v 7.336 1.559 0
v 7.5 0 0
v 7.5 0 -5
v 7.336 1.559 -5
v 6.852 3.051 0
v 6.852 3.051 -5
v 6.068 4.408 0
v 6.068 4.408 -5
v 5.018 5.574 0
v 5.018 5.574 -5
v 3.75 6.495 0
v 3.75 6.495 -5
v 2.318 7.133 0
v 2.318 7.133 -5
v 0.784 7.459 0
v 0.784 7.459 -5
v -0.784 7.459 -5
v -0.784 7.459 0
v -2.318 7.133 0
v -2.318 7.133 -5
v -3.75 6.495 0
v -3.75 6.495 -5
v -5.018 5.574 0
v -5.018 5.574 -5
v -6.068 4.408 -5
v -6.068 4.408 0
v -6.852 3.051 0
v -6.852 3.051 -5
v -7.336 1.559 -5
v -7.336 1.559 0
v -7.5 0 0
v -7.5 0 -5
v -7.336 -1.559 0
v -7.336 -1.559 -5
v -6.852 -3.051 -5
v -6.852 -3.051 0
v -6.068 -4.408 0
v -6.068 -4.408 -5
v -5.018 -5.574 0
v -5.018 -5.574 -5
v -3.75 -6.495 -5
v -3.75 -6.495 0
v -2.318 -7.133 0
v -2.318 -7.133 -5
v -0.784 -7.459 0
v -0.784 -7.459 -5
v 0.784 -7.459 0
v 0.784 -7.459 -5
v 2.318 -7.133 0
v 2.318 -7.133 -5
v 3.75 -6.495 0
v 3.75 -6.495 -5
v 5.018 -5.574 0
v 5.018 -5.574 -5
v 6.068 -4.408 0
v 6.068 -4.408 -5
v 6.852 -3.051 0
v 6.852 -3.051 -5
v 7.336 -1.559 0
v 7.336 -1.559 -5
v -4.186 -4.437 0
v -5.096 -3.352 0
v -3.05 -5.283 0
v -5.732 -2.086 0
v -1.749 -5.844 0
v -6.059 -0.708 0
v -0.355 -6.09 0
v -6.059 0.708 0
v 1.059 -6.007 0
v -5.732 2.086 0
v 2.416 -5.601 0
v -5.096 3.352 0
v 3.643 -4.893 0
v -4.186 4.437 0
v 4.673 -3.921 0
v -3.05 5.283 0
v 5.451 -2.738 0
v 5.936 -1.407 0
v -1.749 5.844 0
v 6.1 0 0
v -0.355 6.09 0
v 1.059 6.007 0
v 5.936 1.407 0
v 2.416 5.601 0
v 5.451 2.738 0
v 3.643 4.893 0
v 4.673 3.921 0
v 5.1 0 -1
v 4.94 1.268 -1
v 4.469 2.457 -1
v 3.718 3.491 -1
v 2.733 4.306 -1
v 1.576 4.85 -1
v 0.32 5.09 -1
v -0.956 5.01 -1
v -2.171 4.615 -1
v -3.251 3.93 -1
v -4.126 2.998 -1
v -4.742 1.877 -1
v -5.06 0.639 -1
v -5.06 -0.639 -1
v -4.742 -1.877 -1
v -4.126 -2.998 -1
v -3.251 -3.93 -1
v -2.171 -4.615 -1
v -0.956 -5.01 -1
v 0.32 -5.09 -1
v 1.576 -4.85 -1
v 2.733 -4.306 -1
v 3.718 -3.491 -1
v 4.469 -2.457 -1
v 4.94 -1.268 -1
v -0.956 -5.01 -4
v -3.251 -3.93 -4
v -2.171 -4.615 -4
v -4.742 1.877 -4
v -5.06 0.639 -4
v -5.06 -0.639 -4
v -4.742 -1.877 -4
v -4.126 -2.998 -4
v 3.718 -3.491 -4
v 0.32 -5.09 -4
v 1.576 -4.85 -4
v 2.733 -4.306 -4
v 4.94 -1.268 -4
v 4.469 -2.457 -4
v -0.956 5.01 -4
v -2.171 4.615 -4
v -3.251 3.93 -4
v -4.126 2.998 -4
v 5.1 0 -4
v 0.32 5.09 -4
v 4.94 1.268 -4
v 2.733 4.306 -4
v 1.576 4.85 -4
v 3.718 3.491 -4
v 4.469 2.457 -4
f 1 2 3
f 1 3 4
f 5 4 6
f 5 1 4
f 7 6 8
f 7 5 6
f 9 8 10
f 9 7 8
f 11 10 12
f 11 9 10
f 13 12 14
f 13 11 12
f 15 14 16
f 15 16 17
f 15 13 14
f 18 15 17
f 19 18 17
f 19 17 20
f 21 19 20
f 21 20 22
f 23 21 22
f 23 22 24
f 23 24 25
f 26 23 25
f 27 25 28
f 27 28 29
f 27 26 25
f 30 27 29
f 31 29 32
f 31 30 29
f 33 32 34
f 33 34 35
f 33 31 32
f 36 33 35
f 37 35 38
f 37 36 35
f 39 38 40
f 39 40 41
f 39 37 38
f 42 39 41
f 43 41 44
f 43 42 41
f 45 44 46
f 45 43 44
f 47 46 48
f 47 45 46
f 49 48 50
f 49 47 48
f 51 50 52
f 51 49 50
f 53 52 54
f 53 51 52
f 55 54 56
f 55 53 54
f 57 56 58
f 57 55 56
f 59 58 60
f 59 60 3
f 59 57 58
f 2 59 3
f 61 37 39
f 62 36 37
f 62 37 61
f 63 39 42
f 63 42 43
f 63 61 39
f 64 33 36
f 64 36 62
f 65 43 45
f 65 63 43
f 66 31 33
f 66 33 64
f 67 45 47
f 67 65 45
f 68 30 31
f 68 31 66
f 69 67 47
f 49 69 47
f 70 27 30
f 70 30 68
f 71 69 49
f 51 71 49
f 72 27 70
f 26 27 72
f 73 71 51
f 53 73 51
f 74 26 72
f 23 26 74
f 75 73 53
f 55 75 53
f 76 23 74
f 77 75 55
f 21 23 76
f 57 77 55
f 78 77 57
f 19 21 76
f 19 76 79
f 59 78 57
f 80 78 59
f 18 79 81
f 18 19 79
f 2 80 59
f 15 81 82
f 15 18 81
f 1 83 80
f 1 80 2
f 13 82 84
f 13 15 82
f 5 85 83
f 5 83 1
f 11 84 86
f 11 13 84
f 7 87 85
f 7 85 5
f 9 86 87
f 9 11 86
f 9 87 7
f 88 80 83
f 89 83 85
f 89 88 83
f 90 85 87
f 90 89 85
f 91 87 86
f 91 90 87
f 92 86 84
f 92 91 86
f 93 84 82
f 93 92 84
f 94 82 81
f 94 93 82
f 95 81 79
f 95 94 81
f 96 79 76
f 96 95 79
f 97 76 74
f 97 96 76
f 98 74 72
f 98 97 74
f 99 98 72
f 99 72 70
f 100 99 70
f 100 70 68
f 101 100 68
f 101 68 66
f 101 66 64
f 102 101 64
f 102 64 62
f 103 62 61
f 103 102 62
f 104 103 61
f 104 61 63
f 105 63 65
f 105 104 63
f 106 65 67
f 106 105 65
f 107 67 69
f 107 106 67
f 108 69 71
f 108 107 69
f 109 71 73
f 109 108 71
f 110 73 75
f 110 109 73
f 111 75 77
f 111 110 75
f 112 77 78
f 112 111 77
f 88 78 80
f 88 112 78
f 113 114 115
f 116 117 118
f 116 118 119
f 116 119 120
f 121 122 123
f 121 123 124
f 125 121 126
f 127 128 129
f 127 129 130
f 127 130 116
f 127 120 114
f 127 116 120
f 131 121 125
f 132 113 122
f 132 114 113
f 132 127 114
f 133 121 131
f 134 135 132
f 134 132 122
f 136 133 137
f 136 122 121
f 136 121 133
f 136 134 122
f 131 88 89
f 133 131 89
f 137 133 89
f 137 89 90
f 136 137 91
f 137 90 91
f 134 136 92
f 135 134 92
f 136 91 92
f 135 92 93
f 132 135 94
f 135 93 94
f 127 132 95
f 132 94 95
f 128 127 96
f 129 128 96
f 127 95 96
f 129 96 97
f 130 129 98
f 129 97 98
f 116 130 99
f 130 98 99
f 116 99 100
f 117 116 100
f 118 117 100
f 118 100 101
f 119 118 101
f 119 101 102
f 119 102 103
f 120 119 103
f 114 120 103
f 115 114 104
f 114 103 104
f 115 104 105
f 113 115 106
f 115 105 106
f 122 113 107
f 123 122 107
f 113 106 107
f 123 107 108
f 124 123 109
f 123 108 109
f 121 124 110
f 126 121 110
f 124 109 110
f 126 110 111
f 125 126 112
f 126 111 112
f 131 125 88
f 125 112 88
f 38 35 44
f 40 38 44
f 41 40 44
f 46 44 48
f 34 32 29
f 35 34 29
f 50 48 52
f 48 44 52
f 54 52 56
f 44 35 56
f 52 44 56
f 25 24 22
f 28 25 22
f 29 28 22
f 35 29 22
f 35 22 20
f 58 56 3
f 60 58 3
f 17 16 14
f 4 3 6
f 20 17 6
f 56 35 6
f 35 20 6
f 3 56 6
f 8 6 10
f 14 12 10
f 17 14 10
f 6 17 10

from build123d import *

# Parameters (mm, degrees)
SKETCH_R     = 7.5
PAD_DEPTH    = 5
SKETCH001_R  = 5.1
POCKET_DEPTH = 4
CHAMFER_SIZE = 1


with BuildPart() as part:
    # Sketch → Pad (new body)
    with BuildSketch(Plane.XY):
        Circle(SKETCH_R)
    extrude(amount=-PAD_DEPTH)

    # Sketch001 → Pocket (cut)
    with BuildSketch(Plane.XY):
        Circle(SKETCH001_R)
    extrude(amount=-POCKET_DEPTH, mode=Mode.SUBTRACT)

    # Chamfer
    chamfer_edges = [part.edges().sort_by_distance(p)[0] for p in [
        (-5.1, 0, 0),
    ]]
    chamfer(chamfer_edges, length=CHAMFER_SIZE)


solid = part.part
